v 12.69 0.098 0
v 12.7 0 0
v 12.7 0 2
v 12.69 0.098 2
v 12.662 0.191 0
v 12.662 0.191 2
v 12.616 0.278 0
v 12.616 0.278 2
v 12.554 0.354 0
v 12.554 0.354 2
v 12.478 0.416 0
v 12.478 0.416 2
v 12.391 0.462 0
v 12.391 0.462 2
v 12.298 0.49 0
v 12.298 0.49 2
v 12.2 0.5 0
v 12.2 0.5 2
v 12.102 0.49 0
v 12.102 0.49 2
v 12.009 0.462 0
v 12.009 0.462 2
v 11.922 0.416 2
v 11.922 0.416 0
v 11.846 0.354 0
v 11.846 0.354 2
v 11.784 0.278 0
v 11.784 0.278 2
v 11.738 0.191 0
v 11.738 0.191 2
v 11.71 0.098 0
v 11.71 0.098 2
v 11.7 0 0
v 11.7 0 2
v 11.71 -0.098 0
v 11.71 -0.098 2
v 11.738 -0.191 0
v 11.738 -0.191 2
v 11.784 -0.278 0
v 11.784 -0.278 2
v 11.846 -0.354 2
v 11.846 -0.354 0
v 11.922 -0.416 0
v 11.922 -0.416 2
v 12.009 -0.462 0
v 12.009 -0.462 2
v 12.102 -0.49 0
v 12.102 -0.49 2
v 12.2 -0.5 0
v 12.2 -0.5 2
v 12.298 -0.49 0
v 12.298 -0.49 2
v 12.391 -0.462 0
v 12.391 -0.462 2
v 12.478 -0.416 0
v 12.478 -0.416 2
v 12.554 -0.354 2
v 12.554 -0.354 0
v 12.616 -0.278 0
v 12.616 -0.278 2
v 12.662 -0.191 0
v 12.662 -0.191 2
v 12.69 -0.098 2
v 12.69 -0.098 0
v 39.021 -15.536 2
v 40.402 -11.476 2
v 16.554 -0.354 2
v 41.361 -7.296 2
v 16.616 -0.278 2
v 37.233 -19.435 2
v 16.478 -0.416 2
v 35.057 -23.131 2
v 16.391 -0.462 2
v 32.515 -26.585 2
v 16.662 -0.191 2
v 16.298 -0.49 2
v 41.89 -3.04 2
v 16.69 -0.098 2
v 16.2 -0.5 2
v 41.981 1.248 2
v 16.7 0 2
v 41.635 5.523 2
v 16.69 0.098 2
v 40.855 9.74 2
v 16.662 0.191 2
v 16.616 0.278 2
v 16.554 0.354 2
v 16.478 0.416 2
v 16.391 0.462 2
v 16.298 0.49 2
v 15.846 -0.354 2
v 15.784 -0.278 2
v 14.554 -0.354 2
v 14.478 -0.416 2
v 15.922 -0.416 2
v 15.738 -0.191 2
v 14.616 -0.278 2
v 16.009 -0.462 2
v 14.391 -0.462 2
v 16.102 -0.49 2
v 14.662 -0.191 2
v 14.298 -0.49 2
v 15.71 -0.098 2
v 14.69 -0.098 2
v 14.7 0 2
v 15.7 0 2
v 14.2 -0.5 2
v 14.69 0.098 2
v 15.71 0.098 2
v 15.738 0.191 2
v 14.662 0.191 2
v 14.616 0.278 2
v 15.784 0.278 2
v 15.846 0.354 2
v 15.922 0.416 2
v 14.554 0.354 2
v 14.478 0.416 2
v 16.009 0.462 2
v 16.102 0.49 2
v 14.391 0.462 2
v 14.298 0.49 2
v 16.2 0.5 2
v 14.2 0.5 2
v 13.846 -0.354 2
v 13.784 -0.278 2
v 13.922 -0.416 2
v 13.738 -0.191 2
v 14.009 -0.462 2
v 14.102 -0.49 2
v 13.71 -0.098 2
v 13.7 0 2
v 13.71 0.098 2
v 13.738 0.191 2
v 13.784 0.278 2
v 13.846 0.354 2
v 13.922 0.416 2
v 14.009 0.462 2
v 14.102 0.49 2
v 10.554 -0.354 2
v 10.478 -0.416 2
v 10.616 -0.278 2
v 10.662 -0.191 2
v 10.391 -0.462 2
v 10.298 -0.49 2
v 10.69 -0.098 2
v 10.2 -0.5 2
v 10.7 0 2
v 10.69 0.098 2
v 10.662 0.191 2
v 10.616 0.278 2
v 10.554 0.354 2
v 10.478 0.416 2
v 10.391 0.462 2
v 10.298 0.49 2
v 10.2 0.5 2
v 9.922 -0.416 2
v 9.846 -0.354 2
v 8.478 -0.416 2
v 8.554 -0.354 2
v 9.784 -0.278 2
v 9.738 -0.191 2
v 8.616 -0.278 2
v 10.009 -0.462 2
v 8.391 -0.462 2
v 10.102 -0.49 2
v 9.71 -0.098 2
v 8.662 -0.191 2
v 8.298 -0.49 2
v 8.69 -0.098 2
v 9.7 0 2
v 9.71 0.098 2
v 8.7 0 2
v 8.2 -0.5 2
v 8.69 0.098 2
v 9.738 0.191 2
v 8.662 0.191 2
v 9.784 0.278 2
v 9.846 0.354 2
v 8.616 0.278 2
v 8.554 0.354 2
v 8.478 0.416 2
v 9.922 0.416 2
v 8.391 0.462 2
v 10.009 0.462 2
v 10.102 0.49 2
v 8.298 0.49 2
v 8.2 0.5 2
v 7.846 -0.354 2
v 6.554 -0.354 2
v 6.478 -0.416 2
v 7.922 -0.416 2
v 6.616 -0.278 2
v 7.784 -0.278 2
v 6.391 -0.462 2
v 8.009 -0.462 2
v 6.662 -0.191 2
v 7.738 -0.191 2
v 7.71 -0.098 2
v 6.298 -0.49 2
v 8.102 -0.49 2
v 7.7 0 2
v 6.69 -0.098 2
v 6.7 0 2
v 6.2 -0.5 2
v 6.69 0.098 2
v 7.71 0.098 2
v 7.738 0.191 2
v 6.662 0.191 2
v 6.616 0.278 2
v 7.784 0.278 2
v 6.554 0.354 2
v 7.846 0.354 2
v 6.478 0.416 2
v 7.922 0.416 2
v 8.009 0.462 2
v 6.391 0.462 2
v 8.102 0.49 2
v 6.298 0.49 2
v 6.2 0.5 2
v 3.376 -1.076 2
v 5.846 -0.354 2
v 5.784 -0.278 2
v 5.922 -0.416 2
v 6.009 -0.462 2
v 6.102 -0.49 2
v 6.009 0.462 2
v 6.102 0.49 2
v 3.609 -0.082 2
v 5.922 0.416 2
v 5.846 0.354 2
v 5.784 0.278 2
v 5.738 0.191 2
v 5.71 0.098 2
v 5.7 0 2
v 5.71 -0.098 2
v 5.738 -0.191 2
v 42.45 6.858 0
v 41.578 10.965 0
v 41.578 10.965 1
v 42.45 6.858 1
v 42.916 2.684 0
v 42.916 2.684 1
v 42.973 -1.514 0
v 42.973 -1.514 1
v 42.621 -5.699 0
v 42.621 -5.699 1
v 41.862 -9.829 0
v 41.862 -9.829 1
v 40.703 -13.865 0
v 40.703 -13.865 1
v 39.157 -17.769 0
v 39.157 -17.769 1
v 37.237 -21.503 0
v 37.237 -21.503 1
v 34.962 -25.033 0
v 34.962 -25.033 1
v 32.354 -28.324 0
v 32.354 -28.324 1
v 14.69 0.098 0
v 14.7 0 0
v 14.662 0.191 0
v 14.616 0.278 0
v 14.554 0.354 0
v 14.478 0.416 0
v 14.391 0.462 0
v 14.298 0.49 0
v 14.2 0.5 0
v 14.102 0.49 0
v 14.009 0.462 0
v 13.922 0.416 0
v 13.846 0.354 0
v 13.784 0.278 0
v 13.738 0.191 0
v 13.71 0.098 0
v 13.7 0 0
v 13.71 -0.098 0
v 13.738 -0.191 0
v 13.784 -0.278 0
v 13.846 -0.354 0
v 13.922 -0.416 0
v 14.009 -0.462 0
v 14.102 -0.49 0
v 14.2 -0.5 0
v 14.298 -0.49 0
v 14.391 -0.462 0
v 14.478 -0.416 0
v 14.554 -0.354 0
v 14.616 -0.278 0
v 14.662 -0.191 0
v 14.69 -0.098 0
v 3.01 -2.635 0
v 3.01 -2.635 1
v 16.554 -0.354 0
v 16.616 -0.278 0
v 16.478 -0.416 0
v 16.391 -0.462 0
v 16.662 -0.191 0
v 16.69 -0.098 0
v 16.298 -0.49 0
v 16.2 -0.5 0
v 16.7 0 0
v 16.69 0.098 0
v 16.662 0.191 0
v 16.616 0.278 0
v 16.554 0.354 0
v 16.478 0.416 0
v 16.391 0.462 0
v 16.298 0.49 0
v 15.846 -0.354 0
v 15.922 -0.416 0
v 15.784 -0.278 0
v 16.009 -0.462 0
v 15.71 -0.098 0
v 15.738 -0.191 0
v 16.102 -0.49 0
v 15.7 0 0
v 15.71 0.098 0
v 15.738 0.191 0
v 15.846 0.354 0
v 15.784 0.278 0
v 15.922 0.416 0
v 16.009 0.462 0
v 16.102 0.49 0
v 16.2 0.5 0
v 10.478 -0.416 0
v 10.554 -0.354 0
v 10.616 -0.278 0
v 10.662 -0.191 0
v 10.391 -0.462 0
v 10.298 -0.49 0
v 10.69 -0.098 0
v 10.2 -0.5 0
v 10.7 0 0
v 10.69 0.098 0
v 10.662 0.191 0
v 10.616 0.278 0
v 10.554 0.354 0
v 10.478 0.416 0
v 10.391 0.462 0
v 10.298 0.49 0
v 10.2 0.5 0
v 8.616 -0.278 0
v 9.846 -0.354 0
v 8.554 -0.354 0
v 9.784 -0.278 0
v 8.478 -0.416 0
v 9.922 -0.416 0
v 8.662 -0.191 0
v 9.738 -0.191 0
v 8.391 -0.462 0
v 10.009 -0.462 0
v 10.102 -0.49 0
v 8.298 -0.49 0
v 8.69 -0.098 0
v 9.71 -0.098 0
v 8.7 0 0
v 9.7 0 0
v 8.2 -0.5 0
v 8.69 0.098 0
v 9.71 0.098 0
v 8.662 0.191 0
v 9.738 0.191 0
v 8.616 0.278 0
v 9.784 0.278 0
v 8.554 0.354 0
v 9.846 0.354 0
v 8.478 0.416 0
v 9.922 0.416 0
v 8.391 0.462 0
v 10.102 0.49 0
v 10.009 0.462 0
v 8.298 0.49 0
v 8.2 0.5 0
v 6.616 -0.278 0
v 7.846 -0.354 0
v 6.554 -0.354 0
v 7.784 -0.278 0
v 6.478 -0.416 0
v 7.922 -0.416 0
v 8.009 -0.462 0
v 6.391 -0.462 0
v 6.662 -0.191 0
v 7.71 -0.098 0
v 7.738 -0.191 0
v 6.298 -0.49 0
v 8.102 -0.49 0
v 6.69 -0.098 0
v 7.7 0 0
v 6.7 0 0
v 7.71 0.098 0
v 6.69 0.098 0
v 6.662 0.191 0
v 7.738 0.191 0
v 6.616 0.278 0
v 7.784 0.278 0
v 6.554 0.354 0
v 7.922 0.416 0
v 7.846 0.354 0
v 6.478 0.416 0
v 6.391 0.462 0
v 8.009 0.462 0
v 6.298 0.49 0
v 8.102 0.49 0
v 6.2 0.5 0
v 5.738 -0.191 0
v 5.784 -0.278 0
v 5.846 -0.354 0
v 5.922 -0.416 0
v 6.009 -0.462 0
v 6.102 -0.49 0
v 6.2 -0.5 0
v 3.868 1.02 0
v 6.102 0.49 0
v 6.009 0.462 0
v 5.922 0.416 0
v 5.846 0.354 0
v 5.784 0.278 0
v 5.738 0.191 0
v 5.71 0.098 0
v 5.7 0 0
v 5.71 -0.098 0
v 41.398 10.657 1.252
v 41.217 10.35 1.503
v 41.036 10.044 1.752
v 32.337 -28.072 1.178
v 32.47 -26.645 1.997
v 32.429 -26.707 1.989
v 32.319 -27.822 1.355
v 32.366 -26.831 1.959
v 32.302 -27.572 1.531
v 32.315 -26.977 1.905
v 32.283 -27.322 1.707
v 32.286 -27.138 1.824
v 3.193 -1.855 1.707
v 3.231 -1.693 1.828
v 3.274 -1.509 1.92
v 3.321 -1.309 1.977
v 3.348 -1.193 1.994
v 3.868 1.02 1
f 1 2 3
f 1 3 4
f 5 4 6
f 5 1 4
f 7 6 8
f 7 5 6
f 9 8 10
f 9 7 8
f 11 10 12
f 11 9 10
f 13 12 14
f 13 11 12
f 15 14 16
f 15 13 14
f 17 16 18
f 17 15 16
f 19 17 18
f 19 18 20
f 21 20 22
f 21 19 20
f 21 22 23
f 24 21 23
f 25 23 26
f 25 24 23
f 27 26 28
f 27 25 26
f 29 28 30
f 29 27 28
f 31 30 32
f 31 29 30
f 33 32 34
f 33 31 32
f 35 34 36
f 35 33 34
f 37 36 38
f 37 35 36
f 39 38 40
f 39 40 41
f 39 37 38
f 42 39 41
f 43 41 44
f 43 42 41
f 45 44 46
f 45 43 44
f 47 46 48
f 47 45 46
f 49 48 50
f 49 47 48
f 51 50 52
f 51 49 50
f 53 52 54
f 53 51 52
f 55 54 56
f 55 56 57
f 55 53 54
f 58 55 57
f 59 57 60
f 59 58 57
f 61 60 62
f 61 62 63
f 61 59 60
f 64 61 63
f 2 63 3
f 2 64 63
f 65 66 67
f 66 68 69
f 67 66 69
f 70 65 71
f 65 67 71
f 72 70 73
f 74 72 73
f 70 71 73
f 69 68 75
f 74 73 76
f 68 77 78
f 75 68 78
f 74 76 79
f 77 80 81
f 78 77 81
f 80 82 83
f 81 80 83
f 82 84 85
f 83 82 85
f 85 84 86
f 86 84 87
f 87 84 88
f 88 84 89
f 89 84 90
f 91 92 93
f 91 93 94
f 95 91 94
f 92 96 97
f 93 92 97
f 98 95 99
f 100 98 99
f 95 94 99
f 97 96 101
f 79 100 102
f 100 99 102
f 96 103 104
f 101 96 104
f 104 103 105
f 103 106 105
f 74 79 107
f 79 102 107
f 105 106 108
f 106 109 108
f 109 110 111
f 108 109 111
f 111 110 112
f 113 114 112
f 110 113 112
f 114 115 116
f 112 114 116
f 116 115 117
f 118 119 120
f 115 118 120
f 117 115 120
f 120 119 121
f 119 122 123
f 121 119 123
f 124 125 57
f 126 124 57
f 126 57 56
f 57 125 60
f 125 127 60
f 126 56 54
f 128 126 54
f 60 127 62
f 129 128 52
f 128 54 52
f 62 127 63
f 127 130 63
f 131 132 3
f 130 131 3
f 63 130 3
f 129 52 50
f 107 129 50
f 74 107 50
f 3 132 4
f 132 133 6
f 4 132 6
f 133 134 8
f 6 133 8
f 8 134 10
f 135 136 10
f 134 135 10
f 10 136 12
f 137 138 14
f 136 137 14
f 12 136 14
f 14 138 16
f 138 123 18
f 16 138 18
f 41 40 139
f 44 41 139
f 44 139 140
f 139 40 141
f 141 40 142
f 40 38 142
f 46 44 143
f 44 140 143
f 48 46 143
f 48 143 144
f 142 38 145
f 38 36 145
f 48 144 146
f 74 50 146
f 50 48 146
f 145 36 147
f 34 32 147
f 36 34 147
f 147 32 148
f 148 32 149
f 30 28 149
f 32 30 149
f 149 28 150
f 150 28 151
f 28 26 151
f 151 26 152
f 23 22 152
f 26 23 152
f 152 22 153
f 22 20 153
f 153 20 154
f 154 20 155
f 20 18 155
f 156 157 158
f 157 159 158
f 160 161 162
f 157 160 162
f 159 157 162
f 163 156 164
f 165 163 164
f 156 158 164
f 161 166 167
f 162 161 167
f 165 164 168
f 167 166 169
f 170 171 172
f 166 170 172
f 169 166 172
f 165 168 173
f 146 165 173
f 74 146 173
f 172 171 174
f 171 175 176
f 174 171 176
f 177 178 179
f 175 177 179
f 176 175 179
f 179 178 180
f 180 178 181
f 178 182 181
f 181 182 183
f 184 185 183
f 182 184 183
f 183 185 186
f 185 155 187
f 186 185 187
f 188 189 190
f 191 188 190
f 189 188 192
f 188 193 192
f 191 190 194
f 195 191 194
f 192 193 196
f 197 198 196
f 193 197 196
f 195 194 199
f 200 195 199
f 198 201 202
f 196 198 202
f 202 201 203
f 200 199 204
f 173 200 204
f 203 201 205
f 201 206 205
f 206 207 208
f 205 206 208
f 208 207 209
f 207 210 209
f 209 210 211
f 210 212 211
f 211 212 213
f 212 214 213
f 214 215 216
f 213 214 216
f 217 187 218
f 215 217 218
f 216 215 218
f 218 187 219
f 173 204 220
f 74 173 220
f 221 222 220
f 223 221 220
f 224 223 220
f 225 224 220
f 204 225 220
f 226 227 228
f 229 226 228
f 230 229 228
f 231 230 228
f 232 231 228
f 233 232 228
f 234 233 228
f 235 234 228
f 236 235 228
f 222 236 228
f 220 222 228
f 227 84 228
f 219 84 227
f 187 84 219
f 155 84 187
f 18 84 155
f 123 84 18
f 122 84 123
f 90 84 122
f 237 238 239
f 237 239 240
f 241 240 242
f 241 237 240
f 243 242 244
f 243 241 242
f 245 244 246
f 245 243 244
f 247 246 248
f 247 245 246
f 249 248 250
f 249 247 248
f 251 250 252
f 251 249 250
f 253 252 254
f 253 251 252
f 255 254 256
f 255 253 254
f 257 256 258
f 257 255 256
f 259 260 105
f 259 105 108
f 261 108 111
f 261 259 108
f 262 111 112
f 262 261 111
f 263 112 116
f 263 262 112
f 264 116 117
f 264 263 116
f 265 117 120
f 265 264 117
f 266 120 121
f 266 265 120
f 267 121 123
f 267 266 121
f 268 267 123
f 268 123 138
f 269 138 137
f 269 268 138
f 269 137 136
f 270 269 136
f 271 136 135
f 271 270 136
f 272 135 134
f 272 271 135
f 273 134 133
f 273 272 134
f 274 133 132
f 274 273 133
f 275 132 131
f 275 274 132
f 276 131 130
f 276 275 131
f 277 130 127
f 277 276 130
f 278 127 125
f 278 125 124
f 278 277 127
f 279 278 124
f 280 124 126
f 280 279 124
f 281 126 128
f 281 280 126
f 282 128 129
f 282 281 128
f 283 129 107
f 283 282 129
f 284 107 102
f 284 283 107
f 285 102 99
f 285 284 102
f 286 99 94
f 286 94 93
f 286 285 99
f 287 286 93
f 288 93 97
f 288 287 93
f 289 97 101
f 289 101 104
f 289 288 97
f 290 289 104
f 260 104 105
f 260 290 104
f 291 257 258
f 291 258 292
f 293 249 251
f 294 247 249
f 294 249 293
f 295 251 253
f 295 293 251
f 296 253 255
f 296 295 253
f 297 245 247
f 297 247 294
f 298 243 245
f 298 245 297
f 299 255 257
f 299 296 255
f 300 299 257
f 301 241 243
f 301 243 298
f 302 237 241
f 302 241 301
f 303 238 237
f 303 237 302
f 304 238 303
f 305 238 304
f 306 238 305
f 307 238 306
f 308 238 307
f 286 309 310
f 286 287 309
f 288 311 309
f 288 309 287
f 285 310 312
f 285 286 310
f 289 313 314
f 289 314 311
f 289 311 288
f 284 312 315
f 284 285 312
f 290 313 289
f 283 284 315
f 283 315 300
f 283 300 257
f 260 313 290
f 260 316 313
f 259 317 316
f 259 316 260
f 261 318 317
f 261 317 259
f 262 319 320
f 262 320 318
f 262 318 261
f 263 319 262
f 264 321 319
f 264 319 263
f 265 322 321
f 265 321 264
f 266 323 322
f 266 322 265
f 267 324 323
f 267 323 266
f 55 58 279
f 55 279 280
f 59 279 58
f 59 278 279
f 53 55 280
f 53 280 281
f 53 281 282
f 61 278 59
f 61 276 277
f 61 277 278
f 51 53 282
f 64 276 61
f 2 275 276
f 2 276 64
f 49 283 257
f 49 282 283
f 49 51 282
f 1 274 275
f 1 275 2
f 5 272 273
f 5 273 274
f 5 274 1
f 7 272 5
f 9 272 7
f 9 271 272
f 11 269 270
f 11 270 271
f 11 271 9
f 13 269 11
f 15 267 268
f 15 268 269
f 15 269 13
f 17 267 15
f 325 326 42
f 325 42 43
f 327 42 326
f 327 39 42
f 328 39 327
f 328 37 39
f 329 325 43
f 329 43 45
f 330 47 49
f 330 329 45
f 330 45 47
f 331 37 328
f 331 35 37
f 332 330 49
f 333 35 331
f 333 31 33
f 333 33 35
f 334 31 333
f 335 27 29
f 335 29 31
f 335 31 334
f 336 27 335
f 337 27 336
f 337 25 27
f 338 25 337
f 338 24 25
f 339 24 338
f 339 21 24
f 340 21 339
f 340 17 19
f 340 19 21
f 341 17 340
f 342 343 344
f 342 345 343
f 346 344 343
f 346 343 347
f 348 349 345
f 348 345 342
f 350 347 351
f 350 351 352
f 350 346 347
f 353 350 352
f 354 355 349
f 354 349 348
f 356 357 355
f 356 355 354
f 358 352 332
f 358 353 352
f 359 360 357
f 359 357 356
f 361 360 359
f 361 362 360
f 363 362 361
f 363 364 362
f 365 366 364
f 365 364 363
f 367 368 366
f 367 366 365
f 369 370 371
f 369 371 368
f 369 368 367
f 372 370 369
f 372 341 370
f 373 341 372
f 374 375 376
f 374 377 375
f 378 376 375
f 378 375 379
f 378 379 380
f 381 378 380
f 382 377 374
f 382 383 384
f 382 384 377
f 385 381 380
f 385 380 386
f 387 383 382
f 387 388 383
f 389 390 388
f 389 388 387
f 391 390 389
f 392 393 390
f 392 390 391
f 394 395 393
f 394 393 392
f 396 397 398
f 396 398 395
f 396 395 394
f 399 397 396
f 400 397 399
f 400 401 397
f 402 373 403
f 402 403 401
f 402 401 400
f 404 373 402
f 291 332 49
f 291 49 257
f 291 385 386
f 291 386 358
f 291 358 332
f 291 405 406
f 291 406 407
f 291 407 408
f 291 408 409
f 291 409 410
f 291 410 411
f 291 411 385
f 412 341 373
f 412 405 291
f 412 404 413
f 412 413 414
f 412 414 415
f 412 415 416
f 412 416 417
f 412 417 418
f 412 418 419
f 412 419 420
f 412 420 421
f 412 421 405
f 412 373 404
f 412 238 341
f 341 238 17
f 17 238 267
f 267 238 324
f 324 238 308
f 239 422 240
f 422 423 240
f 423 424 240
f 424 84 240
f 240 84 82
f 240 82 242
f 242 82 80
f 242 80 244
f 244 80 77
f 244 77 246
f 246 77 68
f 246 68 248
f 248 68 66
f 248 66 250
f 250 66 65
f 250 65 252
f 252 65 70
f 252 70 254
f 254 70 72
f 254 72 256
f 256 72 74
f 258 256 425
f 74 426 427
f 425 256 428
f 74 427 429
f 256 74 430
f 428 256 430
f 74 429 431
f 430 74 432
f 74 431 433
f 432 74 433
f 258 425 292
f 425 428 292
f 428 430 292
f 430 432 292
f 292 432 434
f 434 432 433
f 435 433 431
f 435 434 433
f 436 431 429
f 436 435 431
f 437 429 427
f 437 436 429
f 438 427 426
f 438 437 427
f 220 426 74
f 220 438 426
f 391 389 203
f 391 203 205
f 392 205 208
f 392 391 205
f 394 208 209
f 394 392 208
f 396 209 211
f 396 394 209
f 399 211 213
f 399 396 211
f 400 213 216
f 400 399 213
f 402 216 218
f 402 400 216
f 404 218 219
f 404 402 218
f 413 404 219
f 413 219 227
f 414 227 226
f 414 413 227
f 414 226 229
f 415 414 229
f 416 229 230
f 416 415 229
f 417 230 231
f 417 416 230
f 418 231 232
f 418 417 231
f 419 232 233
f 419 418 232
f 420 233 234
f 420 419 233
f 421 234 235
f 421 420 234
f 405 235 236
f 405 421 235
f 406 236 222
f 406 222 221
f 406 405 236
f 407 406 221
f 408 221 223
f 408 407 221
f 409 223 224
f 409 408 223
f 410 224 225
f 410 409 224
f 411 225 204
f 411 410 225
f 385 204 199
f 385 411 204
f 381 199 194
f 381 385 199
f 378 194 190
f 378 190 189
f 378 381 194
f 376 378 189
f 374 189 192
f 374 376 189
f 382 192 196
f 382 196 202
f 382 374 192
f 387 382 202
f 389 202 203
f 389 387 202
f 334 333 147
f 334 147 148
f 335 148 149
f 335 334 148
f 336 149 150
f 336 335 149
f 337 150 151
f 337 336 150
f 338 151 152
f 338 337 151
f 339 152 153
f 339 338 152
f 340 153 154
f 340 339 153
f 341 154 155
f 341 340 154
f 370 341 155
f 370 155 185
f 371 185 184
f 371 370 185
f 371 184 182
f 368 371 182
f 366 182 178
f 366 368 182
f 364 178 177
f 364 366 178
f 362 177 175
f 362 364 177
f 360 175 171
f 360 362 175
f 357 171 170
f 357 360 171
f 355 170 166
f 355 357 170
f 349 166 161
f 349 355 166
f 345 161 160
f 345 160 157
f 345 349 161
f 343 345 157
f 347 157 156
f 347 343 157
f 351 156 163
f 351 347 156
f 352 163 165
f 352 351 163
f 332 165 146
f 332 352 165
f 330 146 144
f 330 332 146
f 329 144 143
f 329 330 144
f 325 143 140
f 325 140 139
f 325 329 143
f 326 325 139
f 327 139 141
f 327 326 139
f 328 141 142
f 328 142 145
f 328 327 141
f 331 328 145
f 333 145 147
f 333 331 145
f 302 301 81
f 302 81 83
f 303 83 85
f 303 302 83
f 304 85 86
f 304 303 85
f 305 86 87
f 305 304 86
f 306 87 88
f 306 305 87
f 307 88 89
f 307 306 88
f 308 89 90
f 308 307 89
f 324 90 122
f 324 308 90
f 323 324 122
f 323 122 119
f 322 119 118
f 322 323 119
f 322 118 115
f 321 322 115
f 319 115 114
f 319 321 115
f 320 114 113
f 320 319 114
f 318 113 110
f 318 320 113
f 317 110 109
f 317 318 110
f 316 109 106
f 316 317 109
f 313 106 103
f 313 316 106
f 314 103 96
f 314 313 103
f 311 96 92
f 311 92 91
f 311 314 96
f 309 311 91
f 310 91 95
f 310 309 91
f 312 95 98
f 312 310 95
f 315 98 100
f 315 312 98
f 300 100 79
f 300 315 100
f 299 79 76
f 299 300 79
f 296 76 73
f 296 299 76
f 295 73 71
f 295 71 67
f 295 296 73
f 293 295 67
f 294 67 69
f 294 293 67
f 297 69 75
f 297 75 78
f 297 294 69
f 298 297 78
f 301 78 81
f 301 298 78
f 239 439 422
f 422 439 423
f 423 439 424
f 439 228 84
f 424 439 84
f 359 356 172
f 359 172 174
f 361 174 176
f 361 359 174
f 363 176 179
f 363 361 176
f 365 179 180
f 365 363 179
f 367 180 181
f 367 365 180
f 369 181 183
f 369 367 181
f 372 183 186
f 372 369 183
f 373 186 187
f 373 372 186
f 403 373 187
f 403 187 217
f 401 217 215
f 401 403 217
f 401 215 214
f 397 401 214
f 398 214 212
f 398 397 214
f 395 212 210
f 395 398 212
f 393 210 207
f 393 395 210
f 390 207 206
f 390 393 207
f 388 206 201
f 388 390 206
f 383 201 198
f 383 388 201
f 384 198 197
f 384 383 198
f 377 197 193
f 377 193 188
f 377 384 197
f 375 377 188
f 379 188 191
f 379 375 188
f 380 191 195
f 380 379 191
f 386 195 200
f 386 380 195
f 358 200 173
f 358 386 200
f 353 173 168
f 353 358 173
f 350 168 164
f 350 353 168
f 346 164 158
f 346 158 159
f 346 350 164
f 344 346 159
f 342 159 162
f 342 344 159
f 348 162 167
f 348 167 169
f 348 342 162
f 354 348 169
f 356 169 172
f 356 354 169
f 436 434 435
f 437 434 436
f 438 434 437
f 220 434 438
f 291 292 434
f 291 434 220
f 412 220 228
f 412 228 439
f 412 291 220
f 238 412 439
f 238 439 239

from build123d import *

# Parameters (mm, degrees)
SKETCH1_R           = 0.5
BOSS_EXTRUDE1_DEPTH = 2
CHAMFER1_SIZE       = 1
FILLET1_R           = 1


with BuildPart() as part:
    # Sketch1 → Boss-Extrude1 (new body)
    with BuildSketch(Plane.XY):
        with BuildLine():
            Line((3.867755102, 1.020034544), (41.578367347, 10.965371346))
            ThreePointArc((41.578367347, 10.965371346), (41.861667235, -9.828571429), (32.353812612, -28.323679307))
            Line((32.353812612, -28.323679307), (3.009656987, -2.634760866))
            Line((3.009656987, -2.634760866), (3.867755102, 1.020034544))
        make_face()
        with Locations((6.2, 0)):
            Circle(SKETCH1_R, mode=Mode.SUBTRACT)
        with Locations((8.2, 0)):
            Circle(SKETCH1_R, mode=Mode.SUBTRACT)
        with Locations((10.2, 0)):
            Circle(SKETCH1_R, mode=Mode.SUBTRACT)
        with Locations((12.2, 0)):
            Circle(SKETCH1_R, mode=Mode.SUBTRACT)
        with Locations((14.2, 0)):
            Circle(SKETCH1_R, mode=Mode.SUBTRACT)
        with Locations((16.2, 0)):
            Circle(SKETCH1_R, mode=Mode.SUBTRACT)
    extrude(amount=BOSS_EXTRUDE1_DEPTH)

    # Chamfer1
    chamfer1_edges = [part.edges().sort_by_distance(p)[0] for p in [
        (41.861667235, -9.828571429, 2),
        (22.723061224, 5.992702945, 2),
        (17.6817348, -15.479220086, 2),
    ]]
    chamfer(chamfer1_edges, length=CHAMFER1_SIZE)

    # Fillet1
    fillet1_edges = [part.edges().sort_by_distance(p)[0] for p in [
        (17.759814553, -14.218518771, 2),
    ]]
    fillet(fillet1_edges, radius=FILLET1_R)


solid = part.part
